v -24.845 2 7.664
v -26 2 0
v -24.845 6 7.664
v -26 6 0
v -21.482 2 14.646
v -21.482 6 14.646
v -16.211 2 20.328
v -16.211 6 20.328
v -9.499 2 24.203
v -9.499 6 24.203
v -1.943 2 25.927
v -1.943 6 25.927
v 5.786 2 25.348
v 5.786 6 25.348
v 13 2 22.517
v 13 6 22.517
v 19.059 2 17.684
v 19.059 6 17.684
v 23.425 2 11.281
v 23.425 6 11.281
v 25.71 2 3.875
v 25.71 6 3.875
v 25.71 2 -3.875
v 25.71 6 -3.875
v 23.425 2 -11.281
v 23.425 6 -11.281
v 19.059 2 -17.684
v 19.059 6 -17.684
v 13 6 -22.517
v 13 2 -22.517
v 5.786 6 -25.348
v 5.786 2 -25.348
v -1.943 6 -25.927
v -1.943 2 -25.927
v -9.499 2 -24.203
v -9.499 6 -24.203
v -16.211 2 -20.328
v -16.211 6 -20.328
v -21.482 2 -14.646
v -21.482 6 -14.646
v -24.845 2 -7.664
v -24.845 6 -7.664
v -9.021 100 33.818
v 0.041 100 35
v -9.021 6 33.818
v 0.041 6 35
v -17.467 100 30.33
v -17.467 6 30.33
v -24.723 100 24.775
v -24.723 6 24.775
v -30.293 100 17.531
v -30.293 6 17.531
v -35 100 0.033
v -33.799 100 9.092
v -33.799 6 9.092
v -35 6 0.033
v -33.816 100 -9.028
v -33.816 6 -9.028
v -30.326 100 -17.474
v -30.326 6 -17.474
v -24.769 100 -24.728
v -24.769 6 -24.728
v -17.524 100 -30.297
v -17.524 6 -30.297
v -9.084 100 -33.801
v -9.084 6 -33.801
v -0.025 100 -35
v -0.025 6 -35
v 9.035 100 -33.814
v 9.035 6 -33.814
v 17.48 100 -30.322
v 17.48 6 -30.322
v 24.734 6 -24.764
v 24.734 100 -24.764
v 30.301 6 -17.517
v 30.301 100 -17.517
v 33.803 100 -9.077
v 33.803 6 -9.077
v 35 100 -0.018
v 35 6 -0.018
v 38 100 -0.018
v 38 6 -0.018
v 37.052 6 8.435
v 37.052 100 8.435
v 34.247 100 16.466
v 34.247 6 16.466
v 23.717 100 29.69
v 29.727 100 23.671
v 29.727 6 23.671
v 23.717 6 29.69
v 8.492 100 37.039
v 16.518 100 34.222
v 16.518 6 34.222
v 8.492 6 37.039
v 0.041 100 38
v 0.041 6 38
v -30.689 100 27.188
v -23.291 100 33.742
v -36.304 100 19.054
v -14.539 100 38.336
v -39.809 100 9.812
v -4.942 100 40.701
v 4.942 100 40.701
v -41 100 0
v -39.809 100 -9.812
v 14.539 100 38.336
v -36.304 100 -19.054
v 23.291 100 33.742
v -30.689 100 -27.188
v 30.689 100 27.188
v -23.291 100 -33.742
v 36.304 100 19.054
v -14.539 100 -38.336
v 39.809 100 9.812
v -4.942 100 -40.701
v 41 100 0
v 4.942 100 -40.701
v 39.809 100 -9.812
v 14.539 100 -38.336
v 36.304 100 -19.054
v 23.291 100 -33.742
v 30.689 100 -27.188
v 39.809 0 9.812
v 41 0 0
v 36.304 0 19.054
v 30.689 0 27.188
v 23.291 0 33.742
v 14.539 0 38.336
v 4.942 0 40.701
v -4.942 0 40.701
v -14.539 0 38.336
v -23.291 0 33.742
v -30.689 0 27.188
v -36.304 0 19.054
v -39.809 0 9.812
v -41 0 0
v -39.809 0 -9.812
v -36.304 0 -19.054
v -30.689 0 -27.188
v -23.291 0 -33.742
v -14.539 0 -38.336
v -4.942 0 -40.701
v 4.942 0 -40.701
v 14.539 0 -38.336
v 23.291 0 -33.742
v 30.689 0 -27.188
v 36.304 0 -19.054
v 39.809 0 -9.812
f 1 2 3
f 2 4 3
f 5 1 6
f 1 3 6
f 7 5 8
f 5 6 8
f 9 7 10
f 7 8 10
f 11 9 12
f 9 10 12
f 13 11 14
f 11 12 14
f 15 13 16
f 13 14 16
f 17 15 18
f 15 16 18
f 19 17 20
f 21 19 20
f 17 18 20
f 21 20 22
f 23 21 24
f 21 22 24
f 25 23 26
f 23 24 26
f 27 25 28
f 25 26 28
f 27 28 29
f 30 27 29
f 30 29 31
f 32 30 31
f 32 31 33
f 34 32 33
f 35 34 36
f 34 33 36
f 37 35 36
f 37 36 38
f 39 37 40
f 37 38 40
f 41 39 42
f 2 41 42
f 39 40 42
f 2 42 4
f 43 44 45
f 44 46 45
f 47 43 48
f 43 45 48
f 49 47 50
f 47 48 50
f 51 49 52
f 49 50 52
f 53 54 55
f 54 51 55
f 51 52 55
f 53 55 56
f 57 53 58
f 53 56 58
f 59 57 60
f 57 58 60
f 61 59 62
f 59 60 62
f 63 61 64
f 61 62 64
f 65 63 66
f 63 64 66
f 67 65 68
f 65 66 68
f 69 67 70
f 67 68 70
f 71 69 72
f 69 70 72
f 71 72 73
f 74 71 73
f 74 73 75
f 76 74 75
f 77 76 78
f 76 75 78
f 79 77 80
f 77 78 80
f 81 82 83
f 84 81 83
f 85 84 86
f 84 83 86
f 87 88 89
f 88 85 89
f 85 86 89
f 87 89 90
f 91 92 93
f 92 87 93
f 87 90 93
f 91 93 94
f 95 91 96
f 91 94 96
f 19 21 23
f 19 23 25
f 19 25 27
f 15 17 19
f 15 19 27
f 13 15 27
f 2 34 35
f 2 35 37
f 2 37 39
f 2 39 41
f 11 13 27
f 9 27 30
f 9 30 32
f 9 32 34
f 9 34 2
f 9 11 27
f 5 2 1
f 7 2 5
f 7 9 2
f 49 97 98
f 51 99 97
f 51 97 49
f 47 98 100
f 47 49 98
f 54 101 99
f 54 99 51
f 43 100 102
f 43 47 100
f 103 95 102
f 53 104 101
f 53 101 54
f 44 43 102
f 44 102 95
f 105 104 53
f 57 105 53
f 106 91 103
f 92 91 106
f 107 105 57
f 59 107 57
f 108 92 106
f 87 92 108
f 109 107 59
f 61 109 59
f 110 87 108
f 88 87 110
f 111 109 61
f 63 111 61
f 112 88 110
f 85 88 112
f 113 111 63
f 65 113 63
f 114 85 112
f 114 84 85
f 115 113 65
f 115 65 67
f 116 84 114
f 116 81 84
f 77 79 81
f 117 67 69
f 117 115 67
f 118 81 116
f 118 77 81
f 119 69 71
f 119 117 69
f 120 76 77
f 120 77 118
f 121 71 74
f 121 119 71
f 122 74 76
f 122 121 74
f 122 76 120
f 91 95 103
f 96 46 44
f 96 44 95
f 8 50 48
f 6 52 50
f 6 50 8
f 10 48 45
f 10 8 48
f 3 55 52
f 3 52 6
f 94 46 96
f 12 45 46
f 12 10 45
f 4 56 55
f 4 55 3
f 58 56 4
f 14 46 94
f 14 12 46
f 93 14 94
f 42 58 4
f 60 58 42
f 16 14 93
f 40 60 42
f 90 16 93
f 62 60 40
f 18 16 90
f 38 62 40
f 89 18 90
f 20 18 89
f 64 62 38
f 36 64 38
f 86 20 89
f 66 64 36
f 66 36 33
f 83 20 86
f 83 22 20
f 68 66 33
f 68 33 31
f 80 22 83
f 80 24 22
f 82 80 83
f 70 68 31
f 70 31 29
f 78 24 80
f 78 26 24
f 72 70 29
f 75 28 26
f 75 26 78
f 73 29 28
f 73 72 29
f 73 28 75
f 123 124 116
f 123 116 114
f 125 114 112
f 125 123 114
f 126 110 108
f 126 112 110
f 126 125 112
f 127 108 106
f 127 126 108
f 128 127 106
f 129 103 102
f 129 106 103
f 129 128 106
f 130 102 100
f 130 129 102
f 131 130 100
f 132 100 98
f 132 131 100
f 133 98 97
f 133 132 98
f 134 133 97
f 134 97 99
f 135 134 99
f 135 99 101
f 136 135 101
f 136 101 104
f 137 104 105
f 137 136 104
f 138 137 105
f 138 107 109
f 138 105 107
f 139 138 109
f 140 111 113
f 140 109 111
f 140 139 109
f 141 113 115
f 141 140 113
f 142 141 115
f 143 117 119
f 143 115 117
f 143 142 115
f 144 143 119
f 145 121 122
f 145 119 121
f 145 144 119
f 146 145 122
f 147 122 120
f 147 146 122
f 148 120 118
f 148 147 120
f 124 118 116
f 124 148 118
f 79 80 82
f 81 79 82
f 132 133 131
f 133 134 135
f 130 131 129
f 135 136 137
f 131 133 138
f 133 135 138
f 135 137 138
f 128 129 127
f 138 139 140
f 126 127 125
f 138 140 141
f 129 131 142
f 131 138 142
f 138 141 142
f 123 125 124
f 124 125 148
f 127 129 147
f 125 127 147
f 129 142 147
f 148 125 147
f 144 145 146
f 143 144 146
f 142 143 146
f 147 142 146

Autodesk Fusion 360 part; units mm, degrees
sketch "Sketch1" plane through (0, 0, 0) normal (0, 1, 0) x (1, 0, 0)
  circle A0 centre (0, 0) radius 41
  circle A1 centre (0, 0) radius 35
  line L0 (0.0406, -35) -> (0.0406, -38)
  line L1 (35, 0.0176) -> (38, 0.0176)
  arc A2 (0.0406, -38) -> (38, 0.0176) centre (0, 0) ccw
  dimension "d1" = 82
  dimension "d2" = 70
extrude "Extrude1" add sketch "Sketch1" along normal blind 100
extrude "Extrude2" add sketch "Sketch1" along normal blind 6 contours A1
extrude "Extrude3" add sketch "Sketch1" along normal blind 6 contours A1 L0 L1 A2
sketch "Sketch2" plane through (0, 6, 0) normal (0, 1, 0) x (-1, 0, 0)
  line L0 (-0.0406, 35) -> (-0.0406, 38)
  arc A0 (-0.0406, 38) -> (-38, -0.0176) centre (0, 0) ccw
  line L1 (-38, -0.0176) -> (-35, -0.0176)
  circle A1 centre (0, 0) radius 26
  arc A2 (-35, -0.0176) -> (-0.0406, 35) centre (0, 0) ccw
  dimension "d10" = 52
extrude "Extrude4" cut sketch "Sketch2" against normal blind 4 contours A1
